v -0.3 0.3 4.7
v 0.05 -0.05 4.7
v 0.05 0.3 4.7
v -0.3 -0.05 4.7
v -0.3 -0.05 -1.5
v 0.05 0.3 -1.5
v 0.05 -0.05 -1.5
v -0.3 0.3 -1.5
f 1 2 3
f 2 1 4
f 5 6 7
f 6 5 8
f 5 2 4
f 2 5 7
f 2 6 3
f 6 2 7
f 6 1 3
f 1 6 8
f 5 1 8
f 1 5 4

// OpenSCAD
// file: lib/lodge_kit.scad
// Lodge shell tile kit — shared dimensions and modules.
//
// The game paints a lodge footprint in 5 m cells and resolves the
// exterior from these tiles at half-cell (2.5 m) resolution; see
// internal/world/lodge_shell.go. Every tile is authored in the same
// canonical frame:
//
//   * origin on the lodge floor plane (Z = 0);
//   * wall-type tiles sit on a footprint edge, centred on it, with the
//     OUTSIDE toward SCAD −Y (game +Z) and the wall thickness toward +Y;
//   * roof tiles are centred on a half-cell, with Z = 0 at the tile's
//     lowest corner; slopes fall toward −Y (game +Z);
//   * corner tiles sit on a grid vertex; an outer corner's building is
//     in the SCAD (−X, +Y) quadrant, an inner corner's notch in (+X, −Y).
//
// Colours are near-neutral: the renderer tints walls and roofs per lodge
// from a seeded palette (world.ShellPalette).
//
// Keep these in sync with the constants in lodge_shell.go.

tile   = 2.5;   // ShellTileSize
wall_h = 5.0;   // ShellWallHeight
rise   = 2.1;   // ShellRoofRise, per tile of run
pitch  = rise / tile;

wall_t   = 0.35;  // wall thickness
sink     = 1.5;   // walls run this far below the floor to hide pad grading
roof_t   = 0.25;  // roof slab thickness
overhang = 0.7;   // eaves overhang past the wall plane

c_wall   = [0.92, 0.90, 0.86];
c_stone  = [0.62, 0.61, 0.60];
c_trim   = [0.97, 0.97, 0.95];
c_glass  = [0.30, 0.42, 0.52];
c_door   = [0.36, 0.25, 0.18];
c_roof   = [0.97, 0.97, 0.97];
c_fascia = [0.55, 0.52, 0.50];

// Plain wall panel: timber above a stone plinth, a trim band under the
// eaves.
module wall_panel() {
    color(c_wall)
        translate([-tile/2, 0, -sink]) cube([tile, wall_t, wall_h + sink]);
    color(c_stone)
        translate([-tile/2, -0.06, -sink]) cube([tile, wall_t, sink + 0.7]);
    color(c_trim)
        translate([-tile/2, -0.04, wall_h - 0.3]) cube([tile, 0.1, 0.3]);
    battens();
}

// Horizontal board lines above the plinth.
module battens() {
    color(c_wall * 0.8)
        for (z = [1.3 : 0.6 : wall_h - 0.6])
            translate([-tile/2, -0.03, z]) cube([tile, 0.04, 0.06]);
}

// A framed pane on the outer face. x0/w along the wall, z0/h up it.
module pane(x0, w, z0, h) {
    color(c_trim)
        translate([x0 - 0.1, -0.05, z0 - 0.1]) cube([w + 0.2, 0.06, h + 0.2]);
    color(c_glass)
        translate([x0, -0.08, z0]) cube([w, 0.06, h]);
}

module wall_window() {
    wall_panel();
    pane(-0.7, 1.4, 1.4, 2.2);
    color(c_trim) translate([-0.02, -0.1, 1.4]) cube([0.04, 0.04, 2.2]); // mullion
}

// Tall window flanked by shutters.
module wall_window_alt() {
    wall_panel();
    pane(-0.5, 1.0, 1.2, 2.8);
    color(c_door) {
        translate([-1.0, -0.1, 1.2]) cube([0.4, 0.05, 2.8]);
        translate([ 0.6, -0.1, 1.2]) cube([0.4, 0.05, 2.8]);
    }
}

// Floor-to-eave glazing for food courts: a low stone sill, then glass in
// three lights.
module wall_glazed() {
    color(c_wall)
        translate([-tile/2, 0, -sink]) cube([tile, wall_t, wall_h + sink]);
    color(c_stone)
        translate([-tile/2, -0.06, -sink]) cube([tile, wall_t, sink + 0.35]);
    color(c_glass)
        translate([-tile/2, -0.09, 0.35]) cube([tile, 0.06, wall_h - 0.75]);
    color(c_trim) {
        for (x = [-tile/2, -tile/6, tile/6, tile/2 - 0.08])
            translate([x, -0.12, 0.35]) cube([0.08, 0.06, wall_h - 0.75]);
        translate([-tile/2, -0.12, wall_h - 0.45]) cube([tile, 0.07, 0.1]);
    }
}

// Glazed entry door under a small canopy, with a step.
module door() {
    color(c_wall)
        translate([-tile/2, 0, -sink]) cube([tile, wall_t, wall_h + sink]);
    color(c_stone)
        translate([-tile/2, -0.06, -sink]) cube([tile, wall_t, sink + 0.15]);
    battens();
    color(c_door)
        translate([-0.9, -0.1, 0]) cube([1.8, 0.1, 2.7]);
    color(c_glass) {
        translate([-0.75, -0.13, 0.9]) cube([0.65, 0.05, 1.6]);
        translate([ 0.10, -0.13, 0.9]) cube([0.65, 0.05, 1.6]);
    }
    color(c_trim)
        translate([-tile/2, -0.04, wall_h - 0.3]) cube([tile, 0.1, 0.3]);
    color(c_roof)   // canopy
        translate([-1.2, -1.3, 3.0])
            rotate([-12, 0, 0]) cube([2.4, 1.3, 0.12]);
    color(c_stone)  // step
        translate([-1.1, -0.9, -0.3]) cube([2.2, 0.9, 0.42]);
}

module corner_outer() {
    color(c_stone)
        translate([-0.3, -0.05, -sink]) cube([0.35, 0.35, wall_h + sink - 0.3]);
}

module corner_inner() {
    color(c_trim)
        translate([0, -0.12, 0]) cube([0.12, 0.12, wall_h - 0.3]);
}

// Roof slab over one half-cell. h lists corner heights (in rise units)
// in SCAD order (−X,+Y), (+X,+Y), (+X,−Y), (−X,−Y); split names which
// diagonal the top surface folds along: 0 through corners 0–2, 1
// through corners 1–3.
module roof_tile(h, split) {
    p = [[-tile/2, tile/2], [tile/2, tile/2], [tile/2, -tile/2], [-tile/2, -tile/2]];
    top = [for (i = [0:3]) [p[i][0], p[i][1], h[i] * rise]];
    bot = [for (i = [0:3]) [p[i][0], p[i][1], h[i] * rise - roof_t]];
    tris = split == 0 ? [[0, 1, 2], [0, 2, 3]] : [[0, 1, 3], [1, 2, 3]];
    color(c_roof)
        polyhedron(
            points = concat(top, bot),
            faces = concat(
                // top (clockwise seen from above = outward in OpenSCAD)
                [for (t = tris) [t[0], t[1], t[2]]],
                [for (t = tris) [t[2] + 4, t[1] + 4, t[0] + 4]],
                [for (i = [0:3]) [i, i + 4, (i + 1) % 4 + 4, (i + 1) % 4]]
            ));
}

// Eaves strip past a wall edge: continues the roof plane outward and
// down, finished with a fascia board.
module eave() {
    drop = overhang * pitch;
    color(c_roof)
        polyhedron(
            points = [
                [-tile/2, 0, 0], [tile/2, 0, 0], [tile/2, -overhang, -drop], [-tile/2, -overhang, -drop],
                [-tile/2, 0, -roof_t], [tile/2, 0, -roof_t], [tile/2, -overhang, -drop - roof_t], [-tile/2, -overhang, -drop - roof_t],
            ],
            faces = [[0, 1, 2, 3], [7, 6, 5, 4], [0, 4, 5, 1], [1, 5, 6, 2], [2, 6, 7, 3], [3, 7, 4, 0]]);
    color(c_fascia)
        translate([-tile/2, -overhang - 0.05, -drop - roof_t - 0.1]) cube([tile, 0.08, roof_t + 0.2]);
}

// Eaves in the square past an outer corner: a hip folding along the
// diagonal away from the building.
module eave_corner() {
    o = overhang;
    d = o * pitch;
    color(c_roof)
        polyhedron(
            points = [
                [0, 0, 0], [o, 0, -d], [o, -o, -d], [0, -o, -d],
                [0, 0, -roof_t], [o, 0, -d - roof_t], [o, -o, -d - roof_t], [0, -o, -d - roof_t],
            ],
            faces = [[0, 1, 2], [0, 2, 3], [6, 5, 4], [7, 6, 4], [0, 4, 5, 1], [1, 5, 6, 2], [2, 6, 7, 3], [3, 7, 4, 0]]);
    color(c_fascia) {
        translate([0, -o - 0.05, -d - roof_t - 0.1]) cube([o + 0.05, 0.08, roof_t + 0.2]);
        translate([o - 0.03, -o - 0.05, -d - roof_t - 0.1]) cube([0.08, o + 0.05, roof_t + 0.2]);
    }
}

module chimney() {
    color(c_stone)
        translate([-0.55, -0.55, -1.0]) cube([1.1, 1.1, rise + 3.0]);
    color(c_fascia)
        translate([-0.65, -0.65, rise + 1.8]) cube([1.3, 1.3, 0.2]);
}
// main file
// Lodge shell kit: outer corner post. See lib/lodge_kit.scad.
include <lib/lodge_kit.scad>
corner_outer();
